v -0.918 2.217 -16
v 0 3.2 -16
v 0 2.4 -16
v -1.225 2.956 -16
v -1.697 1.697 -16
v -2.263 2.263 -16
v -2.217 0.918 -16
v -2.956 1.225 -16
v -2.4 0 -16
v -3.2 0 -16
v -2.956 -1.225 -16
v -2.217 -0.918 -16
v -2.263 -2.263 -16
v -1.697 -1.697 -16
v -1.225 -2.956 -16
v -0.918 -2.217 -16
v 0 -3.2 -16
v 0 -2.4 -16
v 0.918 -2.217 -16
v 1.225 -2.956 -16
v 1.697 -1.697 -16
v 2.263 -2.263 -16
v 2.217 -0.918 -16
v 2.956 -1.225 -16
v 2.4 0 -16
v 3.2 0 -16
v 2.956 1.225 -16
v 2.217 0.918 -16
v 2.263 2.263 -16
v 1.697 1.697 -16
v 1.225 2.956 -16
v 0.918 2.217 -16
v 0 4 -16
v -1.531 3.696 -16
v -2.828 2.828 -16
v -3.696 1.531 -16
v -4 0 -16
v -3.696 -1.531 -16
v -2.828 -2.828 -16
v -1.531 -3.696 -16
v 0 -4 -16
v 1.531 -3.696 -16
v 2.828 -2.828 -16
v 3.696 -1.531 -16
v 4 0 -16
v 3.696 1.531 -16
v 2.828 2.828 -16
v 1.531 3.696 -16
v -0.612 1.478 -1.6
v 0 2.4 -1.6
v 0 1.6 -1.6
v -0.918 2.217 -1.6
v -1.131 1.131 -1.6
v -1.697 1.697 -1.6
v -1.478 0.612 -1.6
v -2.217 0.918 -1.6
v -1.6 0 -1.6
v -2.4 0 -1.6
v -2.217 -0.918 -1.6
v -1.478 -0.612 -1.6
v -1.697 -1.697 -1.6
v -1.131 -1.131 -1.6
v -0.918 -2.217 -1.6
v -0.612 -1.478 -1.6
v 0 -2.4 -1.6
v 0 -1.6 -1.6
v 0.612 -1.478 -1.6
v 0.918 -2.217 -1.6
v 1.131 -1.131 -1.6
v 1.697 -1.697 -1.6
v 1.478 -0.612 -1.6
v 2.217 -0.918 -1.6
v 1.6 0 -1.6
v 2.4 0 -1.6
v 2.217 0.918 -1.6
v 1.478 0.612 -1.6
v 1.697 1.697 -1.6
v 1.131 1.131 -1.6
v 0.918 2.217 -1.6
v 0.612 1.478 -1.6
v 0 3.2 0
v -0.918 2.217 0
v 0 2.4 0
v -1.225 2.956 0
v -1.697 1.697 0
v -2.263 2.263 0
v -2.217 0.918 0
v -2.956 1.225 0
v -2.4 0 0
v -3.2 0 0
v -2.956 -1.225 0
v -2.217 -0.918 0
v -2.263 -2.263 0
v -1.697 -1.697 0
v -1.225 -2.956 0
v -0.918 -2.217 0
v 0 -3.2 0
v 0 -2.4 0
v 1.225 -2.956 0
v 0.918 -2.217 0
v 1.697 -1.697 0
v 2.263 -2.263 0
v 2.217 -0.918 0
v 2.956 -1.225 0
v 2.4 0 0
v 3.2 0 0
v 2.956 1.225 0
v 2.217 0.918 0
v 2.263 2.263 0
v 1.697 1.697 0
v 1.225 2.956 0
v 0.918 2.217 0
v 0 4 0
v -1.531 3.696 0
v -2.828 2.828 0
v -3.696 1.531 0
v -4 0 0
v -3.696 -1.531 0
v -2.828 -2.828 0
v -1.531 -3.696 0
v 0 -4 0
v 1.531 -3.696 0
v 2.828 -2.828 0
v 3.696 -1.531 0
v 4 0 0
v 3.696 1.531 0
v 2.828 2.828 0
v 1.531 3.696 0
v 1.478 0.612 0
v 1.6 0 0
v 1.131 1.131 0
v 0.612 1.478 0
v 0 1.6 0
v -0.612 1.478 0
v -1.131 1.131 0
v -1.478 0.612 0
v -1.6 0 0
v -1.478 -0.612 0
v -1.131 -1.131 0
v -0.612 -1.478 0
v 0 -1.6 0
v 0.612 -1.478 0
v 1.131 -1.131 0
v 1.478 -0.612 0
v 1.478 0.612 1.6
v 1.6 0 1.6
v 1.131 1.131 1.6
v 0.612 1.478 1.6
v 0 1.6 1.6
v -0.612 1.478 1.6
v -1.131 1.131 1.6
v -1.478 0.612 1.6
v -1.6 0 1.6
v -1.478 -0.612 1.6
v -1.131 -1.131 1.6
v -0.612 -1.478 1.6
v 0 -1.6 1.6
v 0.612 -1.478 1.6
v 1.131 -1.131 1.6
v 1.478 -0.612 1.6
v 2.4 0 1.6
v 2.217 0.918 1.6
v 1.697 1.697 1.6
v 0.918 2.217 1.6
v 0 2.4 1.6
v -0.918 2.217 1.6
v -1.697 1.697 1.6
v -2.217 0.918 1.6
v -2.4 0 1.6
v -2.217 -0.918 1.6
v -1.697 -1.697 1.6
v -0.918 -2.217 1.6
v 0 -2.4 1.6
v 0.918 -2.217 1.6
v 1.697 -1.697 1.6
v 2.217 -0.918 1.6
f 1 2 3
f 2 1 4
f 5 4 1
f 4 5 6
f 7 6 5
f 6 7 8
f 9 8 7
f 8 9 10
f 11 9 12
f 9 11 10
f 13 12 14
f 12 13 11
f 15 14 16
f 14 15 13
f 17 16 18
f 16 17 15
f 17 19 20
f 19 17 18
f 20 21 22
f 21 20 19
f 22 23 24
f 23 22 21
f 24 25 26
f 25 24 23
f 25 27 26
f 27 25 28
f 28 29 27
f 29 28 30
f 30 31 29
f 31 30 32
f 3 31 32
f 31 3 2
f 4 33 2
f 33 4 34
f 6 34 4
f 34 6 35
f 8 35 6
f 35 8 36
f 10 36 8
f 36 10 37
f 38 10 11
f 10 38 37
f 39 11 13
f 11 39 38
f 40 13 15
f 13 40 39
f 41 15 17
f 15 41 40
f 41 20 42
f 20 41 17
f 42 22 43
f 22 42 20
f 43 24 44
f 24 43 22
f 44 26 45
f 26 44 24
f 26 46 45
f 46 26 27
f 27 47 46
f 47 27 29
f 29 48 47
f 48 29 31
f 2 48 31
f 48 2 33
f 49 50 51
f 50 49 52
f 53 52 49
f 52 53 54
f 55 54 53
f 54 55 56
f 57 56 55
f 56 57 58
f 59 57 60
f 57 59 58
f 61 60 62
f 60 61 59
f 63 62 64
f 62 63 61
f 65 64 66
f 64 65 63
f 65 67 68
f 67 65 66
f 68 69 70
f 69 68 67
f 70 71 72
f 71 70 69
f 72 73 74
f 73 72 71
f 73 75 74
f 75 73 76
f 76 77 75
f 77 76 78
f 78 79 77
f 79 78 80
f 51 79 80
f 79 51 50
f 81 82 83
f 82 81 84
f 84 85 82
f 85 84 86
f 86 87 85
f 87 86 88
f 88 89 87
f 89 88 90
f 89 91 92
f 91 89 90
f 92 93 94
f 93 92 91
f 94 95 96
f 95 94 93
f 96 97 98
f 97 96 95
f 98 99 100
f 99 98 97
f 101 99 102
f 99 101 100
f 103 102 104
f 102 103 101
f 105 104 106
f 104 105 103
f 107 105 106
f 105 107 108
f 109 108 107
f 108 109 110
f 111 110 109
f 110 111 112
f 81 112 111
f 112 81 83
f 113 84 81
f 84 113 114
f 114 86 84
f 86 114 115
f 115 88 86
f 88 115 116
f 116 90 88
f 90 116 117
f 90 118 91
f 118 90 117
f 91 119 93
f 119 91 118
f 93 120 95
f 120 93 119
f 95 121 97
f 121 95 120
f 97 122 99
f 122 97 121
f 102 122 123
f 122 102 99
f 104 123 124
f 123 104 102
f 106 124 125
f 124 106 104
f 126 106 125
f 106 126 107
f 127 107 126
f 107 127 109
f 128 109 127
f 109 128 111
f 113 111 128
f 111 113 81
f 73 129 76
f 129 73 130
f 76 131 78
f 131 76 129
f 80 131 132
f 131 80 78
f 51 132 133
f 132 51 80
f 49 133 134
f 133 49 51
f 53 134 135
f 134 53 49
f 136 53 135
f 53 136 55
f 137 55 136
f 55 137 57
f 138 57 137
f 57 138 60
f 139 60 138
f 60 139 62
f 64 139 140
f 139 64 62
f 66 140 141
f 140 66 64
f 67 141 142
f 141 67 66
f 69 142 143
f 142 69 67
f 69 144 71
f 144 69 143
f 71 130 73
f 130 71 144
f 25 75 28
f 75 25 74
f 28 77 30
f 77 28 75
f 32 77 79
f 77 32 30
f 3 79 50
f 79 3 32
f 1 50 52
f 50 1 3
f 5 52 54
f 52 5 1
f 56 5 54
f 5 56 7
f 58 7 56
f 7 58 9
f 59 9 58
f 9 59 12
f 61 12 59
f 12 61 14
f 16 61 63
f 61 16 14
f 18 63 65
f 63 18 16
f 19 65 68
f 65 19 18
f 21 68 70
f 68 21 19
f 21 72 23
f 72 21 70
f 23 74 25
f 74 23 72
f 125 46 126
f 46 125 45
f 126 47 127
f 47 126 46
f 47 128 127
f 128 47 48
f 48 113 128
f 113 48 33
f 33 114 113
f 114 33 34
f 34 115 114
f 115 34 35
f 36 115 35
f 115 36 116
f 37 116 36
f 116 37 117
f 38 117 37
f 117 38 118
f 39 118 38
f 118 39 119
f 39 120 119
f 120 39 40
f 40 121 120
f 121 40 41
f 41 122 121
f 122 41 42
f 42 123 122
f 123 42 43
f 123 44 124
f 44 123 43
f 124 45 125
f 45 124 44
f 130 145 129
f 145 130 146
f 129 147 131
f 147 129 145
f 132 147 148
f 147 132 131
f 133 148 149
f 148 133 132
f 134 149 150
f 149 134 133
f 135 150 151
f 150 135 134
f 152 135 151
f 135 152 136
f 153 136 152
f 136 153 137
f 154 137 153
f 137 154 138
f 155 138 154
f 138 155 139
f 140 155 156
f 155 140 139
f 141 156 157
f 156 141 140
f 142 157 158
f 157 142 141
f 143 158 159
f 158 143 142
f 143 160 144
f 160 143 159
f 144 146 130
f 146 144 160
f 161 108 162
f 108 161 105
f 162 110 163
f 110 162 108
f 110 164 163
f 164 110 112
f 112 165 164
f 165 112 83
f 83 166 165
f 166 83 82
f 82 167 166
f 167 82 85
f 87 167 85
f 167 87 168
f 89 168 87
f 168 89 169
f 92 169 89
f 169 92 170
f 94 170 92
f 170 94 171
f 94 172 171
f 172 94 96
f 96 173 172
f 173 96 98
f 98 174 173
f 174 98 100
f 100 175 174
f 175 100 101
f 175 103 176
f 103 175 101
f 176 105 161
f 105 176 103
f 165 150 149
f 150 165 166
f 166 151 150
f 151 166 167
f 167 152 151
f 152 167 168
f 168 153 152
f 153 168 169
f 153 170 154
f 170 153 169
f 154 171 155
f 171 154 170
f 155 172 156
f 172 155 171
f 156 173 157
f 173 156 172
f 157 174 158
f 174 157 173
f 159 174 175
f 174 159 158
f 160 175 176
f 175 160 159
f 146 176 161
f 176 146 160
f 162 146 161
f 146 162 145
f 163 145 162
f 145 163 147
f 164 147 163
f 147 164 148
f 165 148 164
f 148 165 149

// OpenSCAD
// file: ../p/stud2a.scad
use <../lib.scad>
use <4-4cyli.scad>
use <4-4edge.scad>
use <4-4ring2.scad>
function ldraw_lib__stud2a() = [
// 0 Stud Open without Base Edges
// 0 Name: stud2a.dat
// 0 Author: James Jessiman
// 0 !LDRAW_ORG Primitive UPDATE 2009-02
// 0 !LICENSE Licensed under CC BY 2.0 and CC BY 4.0 : see CAreadme.txt
// 
// 0 BFC CERTIFY CCW
  [0,"BFC","CERTIFY"],
  [0,"BFC","CCW"],
// 
// 0 !HISTORY 1999-07-05 [PTadmin] Official Update 1999-05
// 0 !HISTORY 2002-04-04 [sbliss] Modified for BFC compliance
// 0 !HISTORY 2002-04-25 [PTadmin] Official Update 2002-02
// 0 !HISTORY 2007-06-24 [PTadmin] Header formatted for Contributor Agreement
// 0 !HISTORY 2008-07-01 [PTadmin] Official Update 2008-01
// 0 !HISTORY 2009-06-21 [cwdee] Update ring references to 4-4ring
// 0 !HISTORY 2009-09-03 [PTadmin] Official Update 2009-02
// 
// 
// 1 16 0 -4 0 4 0 0 0 1 0 0 0 4 4-4edge.dat
  [1,16,0,-4,0,4,0,0,0,1,0,0,0,4, ldraw_lib__4_4edge()],
// 1 16 0 -4 0 6 0 0 0 1 0 0 0 6 4-4edge.dat
  [1,16,0,-4,0,6,0,0,0,1,0,0,0,6, ldraw_lib__4_4edge()],
// 0 BFC INVERTNEXT
  [0,"BFC","INVERTNEXT"],
// 1 16 0 -4 0 4 0 0 0 4 0 0 0 4 4-4cyli.dat
  [1,16,0,-4,0,4,0,0,0,4,0,0,0,4, ldraw_lib__4_4cyli()],
// 1 16 0 -4 0 6 0 0 0 4 0 0 0 6 4-4cyli.dat
  [1,16,0,-4,0,6,0,0,0,4,0,0,0,6, ldraw_lib__4_4cyli()],
// 1 16 0 -4 0 2 0 0 0 1 0 0 0 2 4-4ring2.dat
  [1,16,0,-4,0,2,0,0,0,1,0,0,0,2, ldraw_lib__4_4ring2()],
// 0
];
module ldraw_lib__stud2a(step=0, col=false, unit=2/5, alt=false, line=0.2, solid=!$preview)
    makepoly(ldraw_lib__stud2a(), step=step, col=col, unit=unit, alt=alt, line=line, solid=solid);
ldraw_lib__stud2a(line=0.2);
// file: ../p/4-4ring4.scad
use <../lib.scad>
function ldraw_lib__4_4ring4() = [
// 0 Ring  4 x 1.0
// 0 Name: 4-4ring4.dat
// 0 Author: James Jessiman
// 0 !LDRAW_ORG Primitive UPDATE 2009-01
// 0 !LICENSE Licensed under CC BY 2.0 and CC BY 4.0 : see CAreadme.txt
// 
// 0 BFC CERTIFY CCW
  [0,"BFC","CERTIFY"],
  [0,"BFC","CCW"],
// 
// 0 !HISTORY 1998-12-15 [PTadmin] Official Update 1998-10
// 0 !HISTORY 2002-04-08 [BrickCaster] Modified for BFC compliance
// 0 !HISTORY 2002-04-25 [PTadmin] Official Update 2002-02
// 0 !HISTORY 2007-06-24 [PTadmin] Header formatted for Contributor Agreement
// 0 !HISTORY 2008-07-01 [PTadmin] Official Update 2008-01
// 0 !HISTORY 2008-08-26 [cwdee] Switch polygon winding and rename
// 0 !HISTORY 2009-05-02 [PTadmin] Official Update 2009-01
// 
// 
// 4 16 -1.9135 0 4.6195 -1.5308 0 3.6956 0 0 4 0 0 5
  [4,16,-1.9135,0,4.6195,-1.5308,0,3.6956,0,0,4,0,0,5],
// 4 16 -3.5355 0 3.5355 -2.8284 0 2.8284 -1.5308 0 3.6956 -1.9135 0 4.6195
  [4,16,-3.5355,0,3.5355,-2.8284,0,2.8284,-1.5308,0,3.6956,-1.9135,0,4.6195],
// 4 16 -4.6195 0 1.9135 -3.6956 0 1.5308 -2.8284 0 2.8284 -3.5355 0 3.5355
  [4,16,-4.6195,0,1.9135,-3.6956,0,1.5308,-2.8284,0,2.8284,-3.5355,0,3.5355],
// 4 16 -5 0 0 -4 0 0 -3.6956 0 1.5308 -4.6195 0 1.9135
  [4,16,-5,0,0,-4,0,0,-3.6956,0,1.5308,-4.6195,0,1.9135],
// 4 16 -4.6195 0 -1.9135 -3.6956 0 -1.5308 -4 0 0 -5 0 0
  [4,16,-4.6195,0,-1.9135,-3.6956,0,-1.5308,-4,0,0,-5,0,0],
// 4 16 -3.5355 0 -3.5355 -2.8284 0 -2.8284 -3.6956 0 -1.5308 -4.6195 0 -1.9135
  [4,16,-3.5355,0,-3.5355,-2.8284,0,-2.8284,-3.6956,0,-1.5308,-4.6195,0,-1.9135],
// 4 16 -1.9135 0 -4.6195 -1.5308 0 -3.6956 -2.8284 0 -2.8284 -3.5355 0 -3.5355
  [4,16,-1.9135,0,-4.6195,-1.5308,0,-3.6956,-2.8284,0,-2.8284,-3.5355,0,-3.5355],
// 4 16 0 0 -5 0 0 -4 -1.5308 0 -3.6956 -1.9135 0 -4.6195
  [4,16,0,0,-5,0,0,-4,-1.5308,0,-3.6956,-1.9135,0,-4.6195],
// 4 16 1.9135 0 -4.6195 1.5308 0 -3.6956 0 0 -4 0 0 -5
  [4,16,1.9135,0,-4.6195,1.5308,0,-3.6956,0,0,-4,0,0,-5],
// 4 16 3.5355 0 -3.5355 2.8284 0 -2.8284 1.5308 0 -3.6956 1.9135 0 -4.6195
  [4,16,3.5355,0,-3.5355,2.8284,0,-2.8284,1.5308,0,-3.6956,1.9135,0,-4.6195],
// 4 16 4.6195 0 -1.9135 3.6956 0 -1.5308 2.8284 0 -2.8284 3.5355 0 -3.5355
  [4,16,4.6195,0,-1.9135,3.6956,0,-1.5308,2.8284,0,-2.8284,3.5355,0,-3.5355],
// 4 16 5 0 0 4 0 0 3.6956 0 -1.5308 4.6195 0 -1.9135
  [4,16,5,0,0,4,0,0,3.6956,0,-1.5308,4.6195,0,-1.9135],
// 4 16 4.6195 0 1.9135 3.6956 0 1.5308 4 0 0 5 0 0
  [4,16,4.6195,0,1.9135,3.6956,0,1.5308,4,0,0,5,0,0],
// 4 16 3.5355 0 3.5355 2.8284 0 2.8284 3.6956 0 1.5308 4.6195 0 1.9135
  [4,16,3.5355,0,3.5355,2.8284,0,2.8284,3.6956,0,1.5308,4.6195,0,1.9135],
// 4 16 1.9135 0 4.6195 1.5308 0 3.6956 2.8284 0 2.8284 3.5355 0 3.5355
  [4,16,1.9135,0,4.6195,1.5308,0,3.6956,2.8284,0,2.8284,3.5355,0,3.5355],
// 4 16 0 0 5 0 0 4 1.5308 0 3.6956 1.9135 0 4.6195
  [4,16,0,0,5,0,0,4,1.5308,0,3.6956,1.9135,0,4.6195],
// 0
];
module ldraw_lib__4_4ring4(step=0, col=false, unit=2/5, alt=false, line=0.2, solid=!$preview)
    makepoly(ldraw_lib__4_4ring4(), step=step, col=col, unit=unit, alt=alt, line=line, solid=solid);
ldraw_lib__4_4ring4(line=0.2);
// file: ../p/4-4ring3.scad
use <../lib.scad>
function ldraw_lib__4_4ring3() = [
// 0 Ring  3 x 1.0
// 0 Name: 4-4ring3.dat
// 0 Author: James Jessiman
// 0 !LDRAW_ORG Primitive UPDATE 2009-01
// 0 !LICENSE Licensed under CC BY 2.0 and CC BY 4.0 : see CAreadme.txt
// 
// 0 BFC CERTIFY CCW
  [0,"BFC","CERTIFY"],
  [0,"BFC","CCW"],
// 
// 0 !HISTORY 1998-12-15 [PTadmin] Official Update 1998-10
// 0 !HISTORY 2002-04-05 [hafhead] Added BFC statement
// 0 !HISTORY 2002-04-25 [PTadmin] Official Update 2002-02
// 0 !HISTORY 2007-06-24 [PTadmin] Header formatted for Contributor Agreement
// 0 !HISTORY 2008-07-01 [PTadmin] Official Update 2008-01
// 0 !HISTORY 2008-08-26 [cwdee] Switch polygon winding and rename
// 0 !HISTORY 2009-05-02 [PTadmin] Official Update 2009-01
// 
// 
// 4 16 -1.5308 0 3.6956 -1.1481 0 2.7717 0 0 3 0 0 4
  [4,16,-1.5308,0,3.6956,-1.1481,0,2.7717,0,0,3,0,0,4],
// 4 16 -2.8284 0 2.8284 -2.1213 0 2.1213 -1.1481 0 2.7717 -1.5308 0 3.6956
  [4,16,-2.8284,0,2.8284,-2.1213,0,2.1213,-1.1481,0,2.7717,-1.5308,0,3.6956],
// 4 16 -3.6956 0 1.5308 -2.7717 0 1.1481 -2.1213 0 2.1213 -2.8284 0 2.8284
  [4,16,-3.6956,0,1.5308,-2.7717,0,1.1481,-2.1213,0,2.1213,-2.8284,0,2.8284],
// 4 16 -4 0 0 -3 0 0 -2.7717 0 1.1481 -3.6956 0 1.5308
  [4,16,-4,0,0,-3,0,0,-2.7717,0,1.1481,-3.6956,0,1.5308],
// 4 16 -3.6956 0 -1.5308 -2.7717 0 -1.1481 -3 0 0 -4 0 0
  [4,16,-3.6956,0,-1.5308,-2.7717,0,-1.1481,-3,0,0,-4,0,0],
// 4 16 -2.8284 0 -2.8284 -2.1213 0 -2.1213 -2.7717 0 -1.1481 -3.6956 0 -1.5308
  [4,16,-2.8284,0,-2.8284,-2.1213,0,-2.1213,-2.7717,0,-1.1481,-3.6956,0,-1.5308],
// 4 16 -1.5308 0 -3.6956 -1.1481 0 -2.7717 -2.1213 0 -2.1213 -2.8284 0 -2.8284
  [4,16,-1.5308,0,-3.6956,-1.1481,0,-2.7717,-2.1213,0,-2.1213,-2.8284,0,-2.8284],
// 4 16 0 0 -4 0 0 -3 -1.1481 0 -2.7717 -1.5308 0 -3.6956
  [4,16,0,0,-4,0,0,-3,-1.1481,0,-2.7717,-1.5308,0,-3.6956],
// 4 16 1.5308 0 -3.6956 1.1481 0 -2.7717 0 0 -3 0 0 -4
  [4,16,1.5308,0,-3.6956,1.1481,0,-2.7717,0,0,-3,0,0,-4],
// 4 16 2.8284 0 -2.8284 2.1213 0 -2.1213 1.1481 0 -2.7717 1.5308 0 -3.6956
  [4,16,2.8284,0,-2.8284,2.1213,0,-2.1213,1.1481,0,-2.7717,1.5308,0,-3.6956],
// 4 16 3.6956 0 -1.5308 2.7717 0 -1.1481 2.1213 0 -2.1213 2.8284 0 -2.8284
  [4,16,3.6956,0,-1.5308,2.7717,0,-1.1481,2.1213,0,-2.1213,2.8284,0,-2.8284],
// 4 16 4 0 0 3 0 0 2.7717 0 -1.1481 3.6956 0 -1.5308
  [4,16,4,0,0,3,0,0,2.7717,0,-1.1481,3.6956,0,-1.5308],
// 4 16 3.6956 0 1.5308 2.7717 0 1.1481 3 0 0 4 0 0
  [4,16,3.6956,0,1.5308,2.7717,0,1.1481,3,0,0,4,0,0],
// 4 16 2.8284 0 2.8284 2.1213 0 2.1213 2.7717 0 1.1481 3.6956 0 1.5308
  [4,16,2.8284,0,2.8284,2.1213,0,2.1213,2.7717,0,1.1481,3.6956,0,1.5308],
// 4 16 1.5308 0 3.6956 1.1481 0 2.7717 2.1213 0 2.1213 2.8284 0 2.8284
  [4,16,1.5308,0,3.6956,1.1481,0,2.7717,2.1213,0,2.1213,2.8284,0,2.8284],
// 4 16 0 0 4 0 0 3 1.1481 0 2.7717 1.5308 0 3.6956
  [4,16,0,0,4,0,0,3,1.1481,0,2.7717,1.5308,0,3.6956],
// 0
];
module ldraw_lib__4_4ring3(step=0, col=false, unit=2/5, alt=false, line=0.2, solid=!$preview)
    makepoly(ldraw_lib__4_4ring3(), step=step, col=col, unit=unit, alt=alt, line=line, solid=solid);
ldraw_lib__4_4ring3(line=0.2);
// file: ../p/4-4ring2.scad
use <../lib.scad>
function ldraw_lib__4_4ring2() = [
// 0 Ring  2 x 1.0
// 0 Name: 4-4ring2.dat
// 0 Author: James Jessiman
// 0 !LDRAW_ORG Primitive UPDATE 2009-01
// 0 !LICENSE Licensed under CC BY 2.0 and CC BY 4.0 : see CAreadme.txt
// 
// 0 BFC CERTIFY CCW
  [0,"BFC","CERTIFY"],
  [0,"BFC","CCW"],
// 
// 0 !HISTORY 1998-12-15 [PTadmin] Official Update 1998-10
// 0 !HISTORY 2002-04-05 [hafhead] Added BFC statement
// 0 !HISTORY 2002-04-25 [PTadmin] Official Update 2002-02
// 0 !HISTORY 2007-06-24 [PTadmin] Header formatted for Contributor Agreement
// 0 !HISTORY 2008-07-01 [PTadmin] Official Update 2008-01
// 0 !HISTORY 2008-08-26 [cwdee] Switch polygon winding and rename
// 0 !HISTORY 2009-05-02 [PTadmin] Official Update 2009-01
// 
// 
// 4 16 -1.1481 0 2.7717 -0.7654 0 1.8478 0 0 2 0 0 3
  [4,16,-1.1481,0,2.7717,-0.7654,0,1.8478,0,0,2,0,0,3],
// 4 16 -2.1213 0 2.1213 -1.4142 0 1.4142 -0.7654 0 1.8478 -1.1481 0 2.7717
  [4,16,-2.1213,0,2.1213,-1.4142,0,1.4142,-0.7654,0,1.8478,-1.1481,0,2.7717],
// 4 16 -2.7717 0 1.1481 -1.8478 0 0.7654 -1.4142 0 1.4142 -2.1213 0 2.1213
  [4,16,-2.7717,0,1.1481,-1.8478,0,0.7654,-1.4142,0,1.4142,-2.1213,0,2.1213],
// 4 16 -3 0 0 -2 0 0 -1.8478 0 0.7654 -2.7717 0 1.1481
  [4,16,-3,0,0,-2,0,0,-1.8478,0,0.7654,-2.7717,0,1.1481],
// 4 16 -2.7717 0 -1.1481 -1.8478 0 -0.7654 -2 0 0 -3 0 0
  [4,16,-2.7717,0,-1.1481,-1.8478,0,-0.7654,-2,0,0,-3,0,0],
// 4 16 -2.1213 0 -2.1213 -1.4142 0 -1.4142 -1.8478 0 -0.7654 -2.7717 0 -1.1481
  [4,16,-2.1213,0,-2.1213,-1.4142,0,-1.4142,-1.8478,0,-0.7654,-2.7717,0,-1.1481],
// 4 16 -1.1481 0 -2.7717 -0.7654 0 -1.8478 -1.4142 0 -1.4142 -2.1213 0 -2.1213
  [4,16,-1.1481,0,-2.7717,-0.7654,0,-1.8478,-1.4142,0,-1.4142,-2.1213,0,-2.1213],
// 4 16 0 0 -3 0 0 -2 -0.7654 0 -1.8478 -1.1481 0 -2.7717
  [4,16,0,0,-3,0,0,-2,-0.7654,0,-1.8478,-1.1481,0,-2.7717],
// 4 16 1.1481 0 -2.7717 0.7654 0 -1.8478 0 0 -2 0 0 -3
  [4,16,1.1481,0,-2.7717,0.7654,0,-1.8478,0,0,-2,0,0,-3],
// 4 16 2.1213 0 -2.1213 1.4142 0 -1.4142 0.7654 0 -1.8478 1.1481 0 -2.7717
  [4,16,2.1213,0,-2.1213,1.4142,0,-1.4142,0.7654,0,-1.8478,1.1481,0,-2.7717],
// 4 16 2.7717 0 -1.1481 1.8478 0 -0.7654 1.4142 0 -1.4142 2.1213 0 -2.1213
  [4,16,2.7717,0,-1.1481,1.8478,0,-0.7654,1.4142,0,-1.4142,2.1213,0,-2.1213],
// 4 16 3 0 0 2 0 0 1.8478 0 -0.7654 2.7717 0 -1.1481
  [4,16,3,0,0,2,0,0,1.8478,0,-0.7654,2.7717,0,-1.1481],
// 4 16 2.7717 0 1.1481 1.8478 0 0.7654 2 0 0 3 0 0
  [4,16,2.7717,0,1.1481,1.8478,0,0.7654,2,0,0,3,0,0],
// 4 16 2.1213 0 2.1213 1.4142 0 1.4142 1.8478 0 0.7654 2.7717 0 1.1481
  [4,16,2.1213,0,2.1213,1.4142,0,1.4142,1.8478,0,0.7654,2.7717,0,1.1481],
// 4 16 1.1481 0 2.7717 0.7654 0 1.8478 1.4142 0 1.4142 2.1213 0 2.1213
  [4,16,1.1481,0,2.7717,0.7654,0,1.8478,1.4142,0,1.4142,2.1213,0,2.1213],
// 4 16 0 0 3 0 0 2 0.7654 0 1.8478 1.1481 0 2.7717
  [4,16,0,0,3,0,0,2,0.7654,0,1.8478,1.1481,0,2.7717],
// 0
];
module ldraw_lib__4_4ring2(step=0, col=false, unit=2/5, alt=false, line=0.2, solid=!$preview)
    makepoly(ldraw_lib__4_4ring2(), step=step, col=col, unit=unit, alt=alt, line=line, solid=solid);
ldraw_lib__4_4ring2(line=0.2);
// file: ../p/4-4edge.scad
use <../lib.scad>
function ldraw_lib__4_4edge() = [
// 0 Circle 1.0
// 0 Name: 4-4edge.dat
// 0 Author: James Jessiman
// 0 !LDRAW_ORG Primitive UPDATE 2017-01
// 0 !LICENSE Licensed under CC BY 2.0 and CC BY 4.0 : see CAreadme.txt
// 
// 0 BFC CERTIFY CCW
  [0,"BFC","CERTIFY"],
  [0,"BFC","CCW"],
// 
// 0 !HISTORY 1998-12-15 [PTadmin] Official Update 1998-10
// 0 !HISTORY 2005-12-28 [PTadmin] Official Update 2005-01
// 0 !HISTORY 2007-06-24 [PTadmin] Header formatted for Contributor Agreement
// 0 !HISTORY 2008-07-01 [PTadmin] Official Update 2008-01
// 0 !HISTORY 2017-01-15 [Steffen] BFCed
// 0 !HISTORY 2017-12-30 [PTadmin] Official Update 2017-01
// 
// 
// 2 24 1 0 0 0.9239 0 0.3827
  [2,24,1,0,0,0.9239,0,0.3827],
// 2 24 0.9239 0 0.3827 0.7071 0 0.7071
  [2,24,0.9239,0,0.3827,0.7071,0,0.7071],
// 2 24 0.7071 0 0.7071 0.3827 0 0.9239
  [2,24,0.7071,0,0.7071,0.3827,0,0.9239],
// 2 24 0.3827 0 0.9239 0 0 1
  [2,24,0.3827,0,0.9239,0,0,1],
// 2 24 0 0 1 -0.3827 0 0.9239
  [2,24,0,0,1,-0.3827,0,0.9239],
// 2 24 -0.3827 0 0.9239 -0.7071 0 0.7071
  [2,24,-0.3827,0,0.9239,-0.7071,0,0.7071],
// 2 24 -0.7071 0 0.7071 -0.9239 0 0.3827
  [2,24,-0.7071,0,0.7071,-0.9239,0,0.3827],
// 2 24 -0.9239 0 0.3827 -1 0 -0
  [2,24,-0.9239,0,0.3827,-1,0,-0],
// 2 24 -1 0 -0 -0.9239 0 -0.3827
  [2,24,-1,0,-0,-0.9239,0,-0.3827],
// 2 24 -0.9239 0 -0.3827 -0.7071 0 -0.7071
  [2,24,-0.9239,0,-0.3827,-0.7071,0,-0.7071],
// 2 24 -0.7071 0 -0.7071 -0.3827 0 -0.9239
  [2,24,-0.7071,0,-0.7071,-0.3827,0,-0.9239],
// 2 24 -0.3827 0 -0.9239 0 0 -1
  [2,24,-0.3827,0,-0.9239,0,0,-1],
// 2 24 0 0 -1 0.3827 0 -0.9239
  [2,24,0,0,-1,0.3827,0,-0.9239],
// 2 24 0.3827 0 -0.9239 0.7071 0 -0.7071
  [2,24,0.3827,0,-0.9239,0.7071,0,-0.7071],
// 2 24 0.7071 0 -0.7071 0.9239 0 -0.3827
  [2,24,0.7071,0,-0.7071,0.9239,0,-0.3827],
// 2 24 0.9239 0 -0.3827 1 0 0
  [2,24,0.9239,0,-0.3827,1,0,0],
];
module ldraw_lib__4_4edge(step=0, col=false, unit=2/5, alt=false, line=0.2, solid=!$preview)
    makepoly(ldraw_lib__4_4edge(), step=step, col=col, unit=unit, alt=alt, line=line, solid=solid);
ldraw_lib__4_4edge(line=0.2);
// file: ../p/4-4cyli.scad
use <../lib.scad>
function ldraw_lib__4_4cyli() = [
// 0 Cylinder 1.0
// 0 Name: 4-4cyli.dat
// 0 Author: James Jessiman
// 0 !LDRAW_ORG Primitive UPDATE 2005-01
// 0 !LICENSE Licensed under CC BY 2.0 and CC BY 4.0 : see CAreadme.txt
// 
// 0 BFC CERTIFY CCW
  [0,"BFC","CERTIFY"],
  [0,"BFC","CCW"],
// 
// 0 !HISTORY 1998-12-15 [PTadmin] Official Update 1998-10
// 0 !HISTORY 2002-03-23 [sbliss] Added BFC statement; merged headers from files in distributions LDraw 0.27 and Complete.
// 0 !HISTORY 2002-04-25 [PTadmin] Official Update 2002-02
// 0 !HISTORY 2004-12-14 [guyvivan] BFC CCW
// 0 !HISTORY 2005-12-28 [PTadmin] Official Update 2005-01
// 0 !HISTORY 2007-06-24 [PTadmin] Header formatted for Contributor Agreement
// 0 !HISTORY 2008-07-01 [PTadmin] Official Update 2008-01
// 
// 
// 4 16 1 1 0 0.9239 1 0.3827 0.9239 0 0.3827 1 0 0
  [4,16,1,1,0,0.9239,1,0.3827,0.9239,0,0.3827,1,0,0],
// 5 24 1 0 0 1 1 0 0.9239 0 0.3827 0.9239 0 -0.3827
  [5,24,1,0,0,1,1,0,0.9239,0,0.3827,0.9239,0,-0.3827],
// 4 16 0.9239 1 0.3827 0.7071 1 0.7071 0.7071 0 0.7071 0.9239 0 0.3827
  [4,16,0.9239,1,0.3827,0.7071,1,0.7071,0.7071,0,0.7071,0.9239,0,0.3827],
// 5 24 0.9239 0 0.3827 0.9239 1 0.3827 0.7071 0 0.7071 1 0 0
  [5,24,0.9239,0,0.3827,0.9239,1,0.3827,0.7071,0,0.7071,1,0,0],
// 4 16 0.7071 1 0.7071 0.3827 1 0.9239 0.3827 0 0.9239 0.7071 0 0.7071
  [4,16,0.7071,1,0.7071,0.3827,1,0.9239,0.3827,0,0.9239,0.7071,0,0.7071],
// 5 24 0.7071 0 0.7071 0.7071 1 0.7071 0.3827 0 0.9239 0.9239 0 0.3827
  [5,24,0.7071,0,0.7071,0.7071,1,0.7071,0.3827,0,0.9239,0.9239,0,0.3827],
// 4 16 0.3827 1 0.9239 0 1 1 0 0 1 0.3827 0 0.9239
  [4,16,0.3827,1,0.9239,0,1,1,0,0,1,0.3827,0,0.9239],
// 5 24 0.3827 0 0.9239 0.3827 1 0.9239 0 0 1 0.7071 0 0.7071
  [5,24,0.3827,0,0.9239,0.3827,1,0.9239,0,0,1,0.7071,0,0.7071],
// 4 16 0 1 1 -0.3827 1 0.9239 -0.3827 0 0.9239 0 0 1
  [4,16,0,1,1,-0.3827,1,0.9239,-0.3827,0,0.9239,0,0,1],
// 5 24 0 0 1 0 1 1 -0.3827 0 0.9239 0.3827 0 0.9239
  [5,24,0,0,1,0,1,1,-0.3827,0,0.9239,0.3827,0,0.9239],
// 4 16 -0.3827 1 0.9239 -0.7071 1 0.7071 -0.7071 0 0.7071 -0.3827 0 0.9239
  [4,16,-0.3827,1,0.9239,-0.7071,1,0.7071,-0.7071,0,0.7071,-0.3827,0,0.9239],
// 5 24 -0.3827 0 0.9239 -0.3827 1 0.9239 -0.7071 0 0.7071 0 0 1
  [5,24,-0.3827,0,0.9239,-0.3827,1,0.9239,-0.7071,0,0.7071,0,0,1],
// 4 16 -0.7071 1 0.7071 -0.9239 1 0.3827 -0.9239 0 0.3827 -0.7071 0 0.7071
  [4,16,-0.7071,1,0.7071,-0.9239,1,0.3827,-0.9239,0,0.3827,-0.7071,0,0.7071],
// 5 24 -0.7071 0 0.7071 -0.7071 1 0.7071 -0.9239 0 0.3827 -0.3827 0 0.9239
  [5,24,-0.7071,0,0.7071,-0.7071,1,0.7071,-0.9239,0,0.3827,-0.3827,0,0.9239],
// 4 16 -0.9239 1 0.3827 -1 1 0 -1 0 0 -0.9239 0 0.3827
  [4,16,-0.9239,1,0.3827,-1,1,0,-1,0,0,-0.9239,0,0.3827],
// 5 24 -0.9239 0 0.3827 -0.9239 1 0.3827 -1 0 0 -0.7071 0 0.7071
  [5,24,-0.9239,0,0.3827,-0.9239,1,0.3827,-1,0,0,-0.7071,0,0.7071],
// 4 16 -1 1 0 -0.9239 1 -0.3827 -0.9239 0 -0.3827 -1 0 0
  [4,16,-1,1,0,-0.9239,1,-0.3827,-0.9239,0,-0.3827,-1,0,0],
// 5 24 -1 0 0 -1 1 0 -0.9239 0 -0.3827 -0.9239 0 0.3827
  [5,24,-1,0,0,-1,1,0,-0.9239,0,-0.3827,-0.9239,0,0.3827],
// 4 16 -0.9239 1 -0.3827 -0.7071 1 -0.7071 -0.7071 0 -0.7071 -0.9239 0 -0.3827
  [4,16,-0.9239,1,-0.3827,-0.7071,1,-0.7071,-0.7071,0,-0.7071,-0.9239,0,-0.3827],
// 5 24 -0.9239 0 -0.3827 -0.9239 1 -0.3827 -0.7071 0 -0.7071 -1 0 0
  [5,24,-0.9239,0,-0.3827,-0.9239,1,-0.3827,-0.7071,0,-0.7071,-1,0,0],
// 4 16 -0.7071 1 -0.7071 -0.3827 1 -0.9239 -0.3827 0 -0.9239 -0.7071 0 -0.7071
  [4,16,-0.7071,1,-0.7071,-0.3827,1,-0.9239,-0.3827,0,-0.9239,-0.7071,0,-0.7071],
// 5 24 -0.7071 0 -0.7071 -0.7071 1 -0.7071 -0.3827 0 -0.9239 -0.9239 0 -0.3827
  [5,24,-0.7071,0,-0.7071,-0.7071,1,-0.7071,-0.3827,0,-0.9239,-0.9239,0,-0.3827],
// 4 16 -0.3827 1 -0.9239 0 1 -1 0 0 -1 -0.3827 0 -0.9239
  [4,16,-0.3827,1,-0.9239,0,1,-1,0,0,-1,-0.3827,0,-0.9239],
// 5 24 -0.3827 0 -0.9239 -0.3827 1 -0.9239 0 0 -1 -0.7071 0 -0.7071
  [5,24,-0.3827,0,-0.9239,-0.3827,1,-0.9239,0,0,-1,-0.7071,0,-0.7071],
// 4 16 0 1 -1 0.3827 1 -0.9239 0.3827 0 -0.9239 0 0 -1
  [4,16,0,1,-1,0.3827,1,-0.9239,0.3827,0,-0.9239,0,0,-1],
// 5 24 0 0 -1 0 1 -1 0.3827 0 -0.9239 -0.3827 0 -0.9239
  [5,24,0,0,-1,0,1,-1,0.3827,0,-0.9239,-0.3827,0,-0.9239],
// 4 16 0.3827 1 -0.9239 0.7071 1 -0.7071 0.7071 0 -0.7071 0.3827 0 -0.9239
  [4,16,0.3827,1,-0.9239,0.7071,1,-0.7071,0.7071,0,-0.7071,0.3827,0,-0.9239],
// 5 24 0.3827 0 -0.9239 0.3827 1 -0.9239 0.7071 0 -0.7071 0 0 -1
  [5,24,0.3827,0,-0.9239,0.3827,1,-0.9239,0.7071,0,-0.7071,0,0,-1],
// 4 16 0.7071 1 -0.7071 0.9239 1 -0.3827 0.9239 0 -0.3827 0.7071 0 -0.7071
  [4,16,0.7071,1,-0.7071,0.9239,1,-0.3827,0.9239,0,-0.3827,0.7071,0,-0.7071],
// 5 24 0.7071 0 -0.7071 0.7071 1 -0.7071 0.9239 0 -0.3827 0.3827 0 -0.9239
  [5,24,0.7071,0,-0.7071,0.7071,1,-0.7071,0.9239,0,-0.3827,0.3827,0,-0.9239],
// 4 16 0.9239 1 -0.3827 1 1 0 1 0 0 0.9239 0 -0.3827
  [4,16,0.9239,1,-0.3827,1,1,0,1,0,0,0.9239,0,-0.3827],
// 5 24 0.9239 0 -0.3827 0.9239 1 -0.3827 1 0 0 0.7071 0 -0.7071
  [5,24,0.9239,0,-0.3827,0.9239,1,-0.3827,1,0,0,0.7071,0,-0.7071],
// 0
];
module ldraw_lib__4_4cyli(step=0, col=false, unit=2/5, alt=false, line=0.2, solid=!$preview)
    makepoly(ldraw_lib__4_4cyli(), step=step, col=col, unit=unit, alt=alt, line=line, solid=solid);
ldraw_lib__4_4cyli(line=0.2);
// file: 71075a.scad
use <../lib.scad>
use <../p/4-4cyli.scad>
use <../p/4-4edge.scad>
use <../p/4-4ring2.scad>
use <../p/4-4ring3.scad>
use <../p/4-4ring4.scad>
use <../p/stud2a.scad>
function ldraw_lib__71075a() = [
// 0 Brick  1 x  1 x  1.667 Round
// 0 Name: 71075a.dat
// 0 Author: James Jessiman
// 0 !LDRAW_ORG Part UPDATE 2010-01
// 0 !LICENSE Licensed under CC BY 2.0 and CC BY 4.0 : see CAreadme.txt
// 
// 0 BFC CERTIFY CCW
  [0,"BFC","CERTIFY"],
  [0,"BFC","CCW"],
// 
// 0 !HISTORY 1998-06-20 [PTadmin] Official Update 1998-06
// 0 !HISTORY 2007-10-12 [PTadmin] Header formatted for Contributor Agreement
// 0 !HISTORY 2008-07-01 [PTadmin] Official Update 2008-01
// 0 !HISTORY 2008-07-07 [jriley] Made BFC compliant
// 0 !HISTORY 2008-07-07 [guyvivan] Fixed header and author
// 0 !HISTORY 2009-05-21 [PTadmin] Renamed from 71076. Part number really is 71075, but was mistakenly issued as 71076
// 0 !HISTORY 2010-04-05 [PTadmin] Official Update 2010-01
// 
// 
// 1 16 0 40 0 6 0 0 0 1 0 0 0 6 4-4edge.dat
  [1,16,0,40,0,6,0,0,0,1,0,0,0,6, ldraw_lib__4_4edge()],
// 1 16 0 40 0 10 0 0 0 1 0 0 0 10 4-4edge.dat
  [1,16,0,40,0,10,0,0,0,1,0,0,0,10, ldraw_lib__4_4edge()],
// 1 16 0 4 0 4 0 0 0 1 0 0 0 4 4-4edge.dat
  [1,16,0,4,0,4,0,0,0,1,0,0,0,4, ldraw_lib__4_4edge()],
// 1 16 0 4 0 6 0 0 0 1 0 0 0 6 4-4edge.dat
  [1,16,0,4,0,6,0,0,0,1,0,0,0,6, ldraw_lib__4_4edge()],
// 1 16 0 0 0 6 0 0 0 1 0 0 0 6 4-4edge.dat
  [1,16,0,0,0,6,0,0,0,1,0,0,0,6, ldraw_lib__4_4edge()],
// 1 16 0 0 0 10 0 0 0 1 0 0 0 10 4-4edge.dat
  [1,16,0,0,0,10,0,0,0,1,0,0,0,10, ldraw_lib__4_4edge()],
// 1 16 0 40 0 2 0 0 0 -1 0 0 0 2 4-4ring3.dat
  [1,16,0,40,0,2,0,0,0,-1,0,0,0,2, ldraw_lib__4_4ring3()],
// 1 16 0 40 0 2 0 0 0 -1 0 0 0 2 4-4ring4.dat
  [1,16,0,40,0,2,0,0,0,-1,0,0,0,2, ldraw_lib__4_4ring4()],
// 1 16 0 4 0 2 0 0 0 -1 0 0 0 2 4-4ring2.dat
  [1,16,0,4,0,2,0,0,0,-1,0,0,0,2, ldraw_lib__4_4ring2()],
// 1 16 0 0 0 2 0 0 0 1 0 0 0 2 4-4ring3.dat
  [1,16,0,0,0,2,0,0,0,1,0,0,0,2, ldraw_lib__4_4ring3()],
// 1 16 0 0 0 2 0 0 0 1 0 0 0 2 4-4ring4.dat
  [1,16,0,0,0,2,0,0,0,1,0,0,0,2, ldraw_lib__4_4ring4()],
// 0 BFC INVERTNEXT
  [0,"BFC","INVERTNEXT"],
// 1 16 0 0 0 4 0 0 0 4 0 0 0 4 4-4cyli.dat
  [1,16,0,0,0,4,0,0,0,4,0,0,0,4, ldraw_lib__4_4cyli()],
// 0 BFC INVERTNEXT
  [0,"BFC","INVERTNEXT"],
// 1 16 0 4 0 6 0 0 0 36 0 0 0 6 4-4cyli.dat
  [1,16,0,4,0,6,0,0,0,36,0,0,0,6, ldraw_lib__4_4cyli()],
// 1 16 0 0 0 10 0 0 0 40 0 0 0 10 4-4cyli.dat
  [1,16,0,0,0,10,0,0,0,40,0,0,0,10, ldraw_lib__4_4cyli()],
// 1 16 0 0 0 1 0 0 0 1 0 0 0 1 stud2a.dat
  [1,16,0,0,0,1,0,0,0,1,0,0,0,1, ldraw_lib__stud2a()],
// 0
];
module ldraw_lib__71075a(step=0, col=false, unit=2/5, alt=false, line=0.2, solid=!$preview)
    makepoly(ldraw_lib__71075a(), step=step, col=col, unit=unit, alt=alt, line=line, solid=solid);
ldraw_lib__71075a(line=0.2);
// file: 71076.scad
use <../lib.scad>
use <71075a.scad>
function ldraw_lib__71076() = [
// 0 ~Moved to 71075a
// 0 Name: 71076.dat
// 0 Author: [PTadmin]
// 0 !LDRAW_ORG Part UPDATE 2010-03
// 0 !LICENSE Licensed under CC BY 4.0 : see CAreadme.txt
// 
// 0 BFC CERTIFY CCW
  [0,"BFC","CERTIFY"],
  [0,"BFC","CCW"],
// 
// 0 !HISTORY 2010-12-31 [PTadmin] Official Update 2010-03
// 
// 
// 0 // Exhaust Pipe Straight
// 1 16 0 0 0 1 0 0 0 1 0 0 0 1 71075a.dat
  [1,16,0,0,0,1,0,0,0,1,0,0,0,1, ldraw_lib__71075a()],
];
module ldraw_lib__71076(step=0, col=false, unit=2/5, alt=false, line=0.2, solid=!$preview)
    makepoly(ldraw_lib__71076(), step=step, col=col, unit=unit, alt=alt, line=line, solid=solid);
ldraw_lib__71076(line=0.2);
// main file
use <../lib.scad>
use <71076.scad>
function ldraw_lib__407() = [
// 0 ~Moved to 71076
// 0 Name: 407.dat
// 0 Author: [PTadmin]
// 0 !LDRAW_ORG Part UPDATE 1998-06
// 0 !LICENSE Licensed under CC BY 4.0 : see CAreadme.txt
// 
// 0 BFC CERTIFY CCW
  [0,"BFC","CERTIFY"],
  [0,"BFC","CCW"],
// 
// 0 !HISTORY 1998-06-20 [PTadmin] Official Update 1998-06
// 0 !HISTORY 2007-06-30 [PTadmin] Header formatted for Contributor Agreement
// 0 !HISTORY 2008-07-01 [PTadmin] Official Update 2008-01
// 
// 
// 1 16 0 0 0 1 0 0 0 1 0 0 0 1 71076.dat
  [1,16,0,0,0,1,0,0,0,1,0,0,0,1, ldraw_lib__71076()],
];
module ldraw_lib__407(step=0, col=false, unit=2/5, alt=false, line=0.2, solid=!$preview)
    makepoly(ldraw_lib__407(), step=step, col=col, unit=unit, alt=alt, line=line, solid=solid);
ldraw_lib__407(line=0.2);
